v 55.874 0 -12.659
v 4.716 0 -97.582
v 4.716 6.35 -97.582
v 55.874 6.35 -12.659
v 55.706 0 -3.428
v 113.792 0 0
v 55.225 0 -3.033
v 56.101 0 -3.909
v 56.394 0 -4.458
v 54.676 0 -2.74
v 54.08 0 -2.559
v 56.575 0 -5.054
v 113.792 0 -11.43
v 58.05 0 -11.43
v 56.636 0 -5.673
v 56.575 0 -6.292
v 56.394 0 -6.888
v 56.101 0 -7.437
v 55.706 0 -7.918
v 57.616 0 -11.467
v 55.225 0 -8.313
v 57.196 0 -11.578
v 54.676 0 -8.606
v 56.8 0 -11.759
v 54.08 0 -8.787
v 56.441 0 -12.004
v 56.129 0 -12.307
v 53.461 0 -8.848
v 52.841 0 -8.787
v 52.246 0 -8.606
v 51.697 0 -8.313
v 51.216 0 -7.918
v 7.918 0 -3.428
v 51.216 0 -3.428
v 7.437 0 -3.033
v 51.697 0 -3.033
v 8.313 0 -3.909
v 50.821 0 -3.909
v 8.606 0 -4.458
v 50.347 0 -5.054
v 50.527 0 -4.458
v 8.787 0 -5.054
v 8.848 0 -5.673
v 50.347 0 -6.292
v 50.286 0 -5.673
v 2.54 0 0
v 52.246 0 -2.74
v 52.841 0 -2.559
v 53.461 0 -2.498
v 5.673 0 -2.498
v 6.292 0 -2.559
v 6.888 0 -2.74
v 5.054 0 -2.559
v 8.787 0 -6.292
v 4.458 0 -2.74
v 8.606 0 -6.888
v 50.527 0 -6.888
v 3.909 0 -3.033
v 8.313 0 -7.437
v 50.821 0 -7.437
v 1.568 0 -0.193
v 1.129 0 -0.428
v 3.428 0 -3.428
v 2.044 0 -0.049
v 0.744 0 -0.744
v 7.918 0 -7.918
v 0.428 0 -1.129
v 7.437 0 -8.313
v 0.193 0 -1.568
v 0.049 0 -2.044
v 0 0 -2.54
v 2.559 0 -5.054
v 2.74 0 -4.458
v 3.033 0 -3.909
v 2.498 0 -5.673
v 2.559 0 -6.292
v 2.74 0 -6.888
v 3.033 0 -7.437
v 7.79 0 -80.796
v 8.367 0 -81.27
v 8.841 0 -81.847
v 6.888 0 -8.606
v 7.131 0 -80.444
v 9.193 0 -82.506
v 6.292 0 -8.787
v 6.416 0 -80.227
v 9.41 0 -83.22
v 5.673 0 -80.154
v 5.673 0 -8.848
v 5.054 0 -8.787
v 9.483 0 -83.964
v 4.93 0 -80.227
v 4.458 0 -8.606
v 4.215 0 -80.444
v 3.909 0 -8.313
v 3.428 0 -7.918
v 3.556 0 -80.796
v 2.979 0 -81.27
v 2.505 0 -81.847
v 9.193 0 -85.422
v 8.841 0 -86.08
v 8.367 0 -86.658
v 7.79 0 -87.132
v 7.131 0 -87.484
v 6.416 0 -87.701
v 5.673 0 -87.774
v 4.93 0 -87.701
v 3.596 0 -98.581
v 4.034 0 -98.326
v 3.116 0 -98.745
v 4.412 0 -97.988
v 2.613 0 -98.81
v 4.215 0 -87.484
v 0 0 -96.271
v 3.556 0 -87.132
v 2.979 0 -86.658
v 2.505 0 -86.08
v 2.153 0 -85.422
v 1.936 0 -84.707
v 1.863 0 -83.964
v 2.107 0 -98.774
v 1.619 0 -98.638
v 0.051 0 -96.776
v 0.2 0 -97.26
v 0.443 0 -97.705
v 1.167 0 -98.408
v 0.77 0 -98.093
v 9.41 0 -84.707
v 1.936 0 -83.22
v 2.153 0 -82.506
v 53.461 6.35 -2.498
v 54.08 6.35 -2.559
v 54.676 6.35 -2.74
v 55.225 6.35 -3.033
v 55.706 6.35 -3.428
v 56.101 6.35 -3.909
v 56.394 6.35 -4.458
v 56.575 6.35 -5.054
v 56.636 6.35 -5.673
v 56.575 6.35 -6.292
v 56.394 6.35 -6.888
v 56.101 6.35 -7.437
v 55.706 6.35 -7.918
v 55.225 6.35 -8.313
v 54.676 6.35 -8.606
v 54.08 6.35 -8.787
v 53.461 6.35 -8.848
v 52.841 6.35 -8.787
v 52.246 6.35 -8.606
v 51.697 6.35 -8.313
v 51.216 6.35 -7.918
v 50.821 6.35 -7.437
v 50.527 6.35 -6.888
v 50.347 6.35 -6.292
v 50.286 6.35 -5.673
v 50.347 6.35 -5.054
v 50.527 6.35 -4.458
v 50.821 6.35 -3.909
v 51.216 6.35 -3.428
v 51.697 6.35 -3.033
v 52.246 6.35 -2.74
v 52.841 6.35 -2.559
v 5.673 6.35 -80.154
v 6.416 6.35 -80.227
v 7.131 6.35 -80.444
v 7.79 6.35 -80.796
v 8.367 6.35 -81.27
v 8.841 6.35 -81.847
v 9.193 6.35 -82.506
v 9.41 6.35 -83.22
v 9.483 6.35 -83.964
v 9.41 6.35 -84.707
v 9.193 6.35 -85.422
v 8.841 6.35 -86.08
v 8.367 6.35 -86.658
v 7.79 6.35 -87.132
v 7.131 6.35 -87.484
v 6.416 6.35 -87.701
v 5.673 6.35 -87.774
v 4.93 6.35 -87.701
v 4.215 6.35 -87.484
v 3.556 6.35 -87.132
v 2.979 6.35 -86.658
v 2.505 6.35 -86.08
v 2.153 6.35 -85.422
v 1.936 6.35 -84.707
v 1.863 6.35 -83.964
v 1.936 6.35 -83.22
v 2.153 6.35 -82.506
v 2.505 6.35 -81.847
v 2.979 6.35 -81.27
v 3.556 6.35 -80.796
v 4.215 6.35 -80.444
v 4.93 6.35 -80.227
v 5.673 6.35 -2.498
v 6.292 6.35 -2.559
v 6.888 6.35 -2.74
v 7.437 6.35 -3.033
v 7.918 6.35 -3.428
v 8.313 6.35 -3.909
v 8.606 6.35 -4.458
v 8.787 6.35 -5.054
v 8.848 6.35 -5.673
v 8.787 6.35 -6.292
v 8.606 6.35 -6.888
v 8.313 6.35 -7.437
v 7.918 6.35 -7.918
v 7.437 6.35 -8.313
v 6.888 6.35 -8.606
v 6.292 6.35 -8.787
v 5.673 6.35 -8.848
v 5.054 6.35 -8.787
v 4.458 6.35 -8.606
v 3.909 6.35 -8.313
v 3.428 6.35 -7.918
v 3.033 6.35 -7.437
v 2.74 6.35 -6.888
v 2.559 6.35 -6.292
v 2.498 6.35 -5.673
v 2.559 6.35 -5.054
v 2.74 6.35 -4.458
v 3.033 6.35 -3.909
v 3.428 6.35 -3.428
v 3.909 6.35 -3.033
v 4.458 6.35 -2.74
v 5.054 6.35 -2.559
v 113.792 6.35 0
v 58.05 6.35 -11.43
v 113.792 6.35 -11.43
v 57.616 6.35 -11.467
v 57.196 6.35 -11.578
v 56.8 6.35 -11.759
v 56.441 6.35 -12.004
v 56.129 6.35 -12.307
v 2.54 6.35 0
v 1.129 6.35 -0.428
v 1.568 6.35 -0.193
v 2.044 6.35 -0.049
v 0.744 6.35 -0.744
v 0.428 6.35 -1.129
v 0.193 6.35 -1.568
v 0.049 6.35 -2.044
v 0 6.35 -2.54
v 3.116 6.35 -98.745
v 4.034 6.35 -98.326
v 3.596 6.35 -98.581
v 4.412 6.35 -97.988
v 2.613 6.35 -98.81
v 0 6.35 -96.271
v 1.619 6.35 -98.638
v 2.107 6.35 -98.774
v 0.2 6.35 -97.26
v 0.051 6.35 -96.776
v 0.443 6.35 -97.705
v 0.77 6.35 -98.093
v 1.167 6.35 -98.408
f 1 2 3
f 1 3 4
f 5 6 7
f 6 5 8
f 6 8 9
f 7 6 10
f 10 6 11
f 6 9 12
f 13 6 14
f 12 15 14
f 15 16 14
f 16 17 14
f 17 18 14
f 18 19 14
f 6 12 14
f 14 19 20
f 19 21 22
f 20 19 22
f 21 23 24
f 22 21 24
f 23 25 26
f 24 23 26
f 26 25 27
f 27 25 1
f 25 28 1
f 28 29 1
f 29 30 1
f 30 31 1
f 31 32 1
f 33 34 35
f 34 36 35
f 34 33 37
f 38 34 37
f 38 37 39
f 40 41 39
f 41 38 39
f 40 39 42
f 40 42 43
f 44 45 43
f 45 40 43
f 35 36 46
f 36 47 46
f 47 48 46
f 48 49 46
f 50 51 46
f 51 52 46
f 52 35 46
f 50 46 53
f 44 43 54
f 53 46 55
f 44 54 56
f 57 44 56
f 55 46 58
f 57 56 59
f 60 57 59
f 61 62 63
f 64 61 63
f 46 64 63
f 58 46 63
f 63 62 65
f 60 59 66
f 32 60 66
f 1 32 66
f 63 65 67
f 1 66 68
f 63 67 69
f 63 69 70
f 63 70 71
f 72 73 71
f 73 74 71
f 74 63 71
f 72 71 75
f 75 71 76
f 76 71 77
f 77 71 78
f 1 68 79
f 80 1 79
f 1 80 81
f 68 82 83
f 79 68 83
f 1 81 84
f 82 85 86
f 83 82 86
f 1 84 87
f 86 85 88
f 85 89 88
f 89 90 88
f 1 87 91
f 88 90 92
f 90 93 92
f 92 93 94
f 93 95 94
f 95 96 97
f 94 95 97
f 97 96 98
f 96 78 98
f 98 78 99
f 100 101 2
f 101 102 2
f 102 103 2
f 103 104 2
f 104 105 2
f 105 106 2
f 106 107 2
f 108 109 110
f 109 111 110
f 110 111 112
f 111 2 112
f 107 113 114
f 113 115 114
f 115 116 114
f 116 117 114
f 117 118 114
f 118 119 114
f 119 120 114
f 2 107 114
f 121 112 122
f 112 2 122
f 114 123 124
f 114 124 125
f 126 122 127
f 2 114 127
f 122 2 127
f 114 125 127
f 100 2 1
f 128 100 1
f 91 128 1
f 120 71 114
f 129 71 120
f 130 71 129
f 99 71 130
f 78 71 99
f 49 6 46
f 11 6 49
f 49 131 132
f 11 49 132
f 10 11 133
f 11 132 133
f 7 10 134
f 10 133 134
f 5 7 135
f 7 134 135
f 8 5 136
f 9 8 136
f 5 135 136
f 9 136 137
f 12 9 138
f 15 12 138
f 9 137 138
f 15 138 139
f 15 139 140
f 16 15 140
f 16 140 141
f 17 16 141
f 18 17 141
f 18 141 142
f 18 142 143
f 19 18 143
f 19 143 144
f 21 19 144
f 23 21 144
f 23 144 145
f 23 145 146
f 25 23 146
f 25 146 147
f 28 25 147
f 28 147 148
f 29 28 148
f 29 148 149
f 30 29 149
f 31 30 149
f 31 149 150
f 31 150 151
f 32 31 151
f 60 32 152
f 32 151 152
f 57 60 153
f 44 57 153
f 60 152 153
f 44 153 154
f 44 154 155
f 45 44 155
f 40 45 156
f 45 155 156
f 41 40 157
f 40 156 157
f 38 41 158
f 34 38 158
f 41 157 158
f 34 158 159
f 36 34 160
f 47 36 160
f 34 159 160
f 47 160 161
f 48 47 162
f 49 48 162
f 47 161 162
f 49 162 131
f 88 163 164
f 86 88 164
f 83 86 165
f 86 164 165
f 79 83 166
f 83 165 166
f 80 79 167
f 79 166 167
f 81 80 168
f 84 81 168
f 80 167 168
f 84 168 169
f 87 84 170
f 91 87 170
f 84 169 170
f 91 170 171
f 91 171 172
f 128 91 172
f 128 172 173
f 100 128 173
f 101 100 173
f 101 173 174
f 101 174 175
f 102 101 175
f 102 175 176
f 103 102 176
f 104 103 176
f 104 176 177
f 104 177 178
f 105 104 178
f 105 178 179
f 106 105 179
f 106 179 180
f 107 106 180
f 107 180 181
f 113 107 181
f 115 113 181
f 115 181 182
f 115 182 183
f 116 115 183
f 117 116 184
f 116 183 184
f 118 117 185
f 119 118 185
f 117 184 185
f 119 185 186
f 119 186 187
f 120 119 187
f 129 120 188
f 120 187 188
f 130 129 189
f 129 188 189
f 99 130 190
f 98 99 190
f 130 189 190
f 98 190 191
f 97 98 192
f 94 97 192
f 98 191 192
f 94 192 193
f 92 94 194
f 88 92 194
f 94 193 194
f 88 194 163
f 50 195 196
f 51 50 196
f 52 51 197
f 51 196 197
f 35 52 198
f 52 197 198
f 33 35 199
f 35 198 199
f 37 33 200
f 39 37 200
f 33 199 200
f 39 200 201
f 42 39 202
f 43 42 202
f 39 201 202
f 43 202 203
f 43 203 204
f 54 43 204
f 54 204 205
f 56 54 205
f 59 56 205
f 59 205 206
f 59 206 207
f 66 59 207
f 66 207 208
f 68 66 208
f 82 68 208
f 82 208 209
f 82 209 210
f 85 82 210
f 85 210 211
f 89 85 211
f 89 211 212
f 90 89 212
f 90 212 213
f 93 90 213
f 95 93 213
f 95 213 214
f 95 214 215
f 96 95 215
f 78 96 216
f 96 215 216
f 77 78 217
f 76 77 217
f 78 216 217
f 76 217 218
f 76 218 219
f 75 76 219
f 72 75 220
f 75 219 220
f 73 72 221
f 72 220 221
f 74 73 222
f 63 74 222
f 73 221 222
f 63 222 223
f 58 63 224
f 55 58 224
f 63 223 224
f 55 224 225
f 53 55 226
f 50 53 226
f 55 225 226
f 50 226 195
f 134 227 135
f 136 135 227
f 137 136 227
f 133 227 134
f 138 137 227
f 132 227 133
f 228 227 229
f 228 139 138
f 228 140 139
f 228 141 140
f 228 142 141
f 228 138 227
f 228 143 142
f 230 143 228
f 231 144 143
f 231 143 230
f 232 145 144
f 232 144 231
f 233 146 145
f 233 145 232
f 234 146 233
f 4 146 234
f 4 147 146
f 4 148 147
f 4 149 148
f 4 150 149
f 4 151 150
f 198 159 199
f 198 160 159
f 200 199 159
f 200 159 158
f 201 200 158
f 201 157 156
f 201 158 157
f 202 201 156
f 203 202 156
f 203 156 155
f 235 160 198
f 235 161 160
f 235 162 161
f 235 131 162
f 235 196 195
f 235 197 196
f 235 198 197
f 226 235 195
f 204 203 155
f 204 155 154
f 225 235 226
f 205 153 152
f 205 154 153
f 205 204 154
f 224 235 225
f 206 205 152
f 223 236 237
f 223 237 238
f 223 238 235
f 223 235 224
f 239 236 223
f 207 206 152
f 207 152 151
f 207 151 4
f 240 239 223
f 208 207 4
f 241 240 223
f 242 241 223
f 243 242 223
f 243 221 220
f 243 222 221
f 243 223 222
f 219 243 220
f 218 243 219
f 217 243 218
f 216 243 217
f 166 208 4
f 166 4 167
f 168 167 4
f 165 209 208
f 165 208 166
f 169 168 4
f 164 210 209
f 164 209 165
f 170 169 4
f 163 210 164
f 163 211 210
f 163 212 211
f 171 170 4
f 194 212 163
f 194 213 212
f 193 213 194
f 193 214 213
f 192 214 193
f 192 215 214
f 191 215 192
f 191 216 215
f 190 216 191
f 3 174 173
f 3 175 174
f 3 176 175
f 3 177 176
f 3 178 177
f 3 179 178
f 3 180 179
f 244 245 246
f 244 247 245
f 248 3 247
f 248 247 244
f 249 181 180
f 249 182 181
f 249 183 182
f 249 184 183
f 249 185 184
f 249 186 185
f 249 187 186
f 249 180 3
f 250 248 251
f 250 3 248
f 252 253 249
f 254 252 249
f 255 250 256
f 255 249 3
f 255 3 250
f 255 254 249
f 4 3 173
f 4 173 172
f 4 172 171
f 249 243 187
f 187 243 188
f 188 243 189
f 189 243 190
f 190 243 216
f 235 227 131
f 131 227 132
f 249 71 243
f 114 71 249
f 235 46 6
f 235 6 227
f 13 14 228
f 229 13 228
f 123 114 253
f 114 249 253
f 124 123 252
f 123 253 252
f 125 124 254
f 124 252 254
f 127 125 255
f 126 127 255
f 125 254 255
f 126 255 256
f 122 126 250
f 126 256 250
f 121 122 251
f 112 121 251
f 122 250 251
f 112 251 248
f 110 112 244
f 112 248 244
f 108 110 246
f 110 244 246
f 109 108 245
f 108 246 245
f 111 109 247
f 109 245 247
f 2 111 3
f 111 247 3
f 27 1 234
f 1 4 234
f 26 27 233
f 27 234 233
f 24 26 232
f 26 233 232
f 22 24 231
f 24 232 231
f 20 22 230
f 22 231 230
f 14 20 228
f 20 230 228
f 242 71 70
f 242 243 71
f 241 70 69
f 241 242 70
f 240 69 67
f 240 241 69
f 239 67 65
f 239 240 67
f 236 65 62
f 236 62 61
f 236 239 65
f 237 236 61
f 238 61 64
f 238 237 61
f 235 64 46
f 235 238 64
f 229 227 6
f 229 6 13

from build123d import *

# Parameters (mm, degrees)
BOSS_EXTRUDE1_DEPTH = 6.35
FILLET1_R           = 2.54
SKETCH3_R           = 3.81
SKETCH3_R_2         = 3.175
CUT_EXTRUDE1_DEPTH  = 118.627520719
SKETCH7_W           = 11.43
SKETCH7_H           = 6.35
BOSS_EXTRUDE3_DEPTH = 56.642
SKETCH8_W           = 0.889
SKETCH8_H           = 6.35
BOSS_EXTRUDE4_DEPTH = 1.27
FILLET2_R           = 2.54


with BuildPart() as part:
    # Sketch1 → Boss-Extrude1 (new body)
    with BuildSketch(Plane(origin=(0, 0, 0), x_dir=(1, 0, 0), z_dir=(0, 1, 0))):
        Polygon((0, 0), (0, 105.41), (63.5, 0), align=None)
    extrude(amount=BOSS_EXTRUDE1_DEPTH)

    # Fillet1
    fillet1_edges = [part.edges().sort_by_distance(p)[0] for p in [
        (0, 3.175, 0),
        (0, 3.175, -105.41),
    ]]
    fillet(fillet1_edges, radius=FILLET1_R)

    # Sketch3 → Cut-Extrude1 (cut, through all)
    with BuildSketch(Plane(origin=(0, 6.35, 0), x_dir=(1, 0, 0), z_dir=(0, 1, 0))):
        with Locations(Location((5.67299463, 83.963748496, 0), (0, 0, 270))):
            Circle(SKETCH3_R)
        with Locations(Location((5.67299463, 5.67299463, 0), (0, 0, 270))):
            Circle(SKETCH3_R_2)
        with Locations(Location((53.460687214, 5.67299463, 0), (0, 0, 270))):
            Circle(SKETCH3_R_2)
    extrude(amount=-CUT_EXTRUDE1_DEPTH, mode=Mode.SUBTRACT)

    # Sketch7 → Boss-Extrude3 (add)
    with BuildSketch(Plane(origin=(57.15, 0, 0), x_dir=(0, 0, -1), z_dir=(1, 0, 0))):
        with Locations((5.715, 3.175)):
            Rectangle(SKETCH7_W, SKETCH7_H)
    extrude(amount=BOSS_EXTRUDE3_DEPTH)

    # Sketch8 → Boss-Extrude4 (add)
    with BuildSketch(Plane(origin=(57.15, 0, 0), x_dir=(0, 0, -1), z_dir=(1, 0, 0))):
        with Locations((10.9855, 3.175)):
            Rectangle(SKETCH8_W, SKETCH8_H)
    extrude(amount=-BOSS_EXTRUDE4_DEPTH)

    # Fillet2
    fillet2_edges = [part.edges().sort_by_distance(p)[0] for p in [
        (56.614457831, 3.175, -11.43),
    ]]
    fillet(fillet2_edges, radius=FILLET2_R)


solid = part.part
